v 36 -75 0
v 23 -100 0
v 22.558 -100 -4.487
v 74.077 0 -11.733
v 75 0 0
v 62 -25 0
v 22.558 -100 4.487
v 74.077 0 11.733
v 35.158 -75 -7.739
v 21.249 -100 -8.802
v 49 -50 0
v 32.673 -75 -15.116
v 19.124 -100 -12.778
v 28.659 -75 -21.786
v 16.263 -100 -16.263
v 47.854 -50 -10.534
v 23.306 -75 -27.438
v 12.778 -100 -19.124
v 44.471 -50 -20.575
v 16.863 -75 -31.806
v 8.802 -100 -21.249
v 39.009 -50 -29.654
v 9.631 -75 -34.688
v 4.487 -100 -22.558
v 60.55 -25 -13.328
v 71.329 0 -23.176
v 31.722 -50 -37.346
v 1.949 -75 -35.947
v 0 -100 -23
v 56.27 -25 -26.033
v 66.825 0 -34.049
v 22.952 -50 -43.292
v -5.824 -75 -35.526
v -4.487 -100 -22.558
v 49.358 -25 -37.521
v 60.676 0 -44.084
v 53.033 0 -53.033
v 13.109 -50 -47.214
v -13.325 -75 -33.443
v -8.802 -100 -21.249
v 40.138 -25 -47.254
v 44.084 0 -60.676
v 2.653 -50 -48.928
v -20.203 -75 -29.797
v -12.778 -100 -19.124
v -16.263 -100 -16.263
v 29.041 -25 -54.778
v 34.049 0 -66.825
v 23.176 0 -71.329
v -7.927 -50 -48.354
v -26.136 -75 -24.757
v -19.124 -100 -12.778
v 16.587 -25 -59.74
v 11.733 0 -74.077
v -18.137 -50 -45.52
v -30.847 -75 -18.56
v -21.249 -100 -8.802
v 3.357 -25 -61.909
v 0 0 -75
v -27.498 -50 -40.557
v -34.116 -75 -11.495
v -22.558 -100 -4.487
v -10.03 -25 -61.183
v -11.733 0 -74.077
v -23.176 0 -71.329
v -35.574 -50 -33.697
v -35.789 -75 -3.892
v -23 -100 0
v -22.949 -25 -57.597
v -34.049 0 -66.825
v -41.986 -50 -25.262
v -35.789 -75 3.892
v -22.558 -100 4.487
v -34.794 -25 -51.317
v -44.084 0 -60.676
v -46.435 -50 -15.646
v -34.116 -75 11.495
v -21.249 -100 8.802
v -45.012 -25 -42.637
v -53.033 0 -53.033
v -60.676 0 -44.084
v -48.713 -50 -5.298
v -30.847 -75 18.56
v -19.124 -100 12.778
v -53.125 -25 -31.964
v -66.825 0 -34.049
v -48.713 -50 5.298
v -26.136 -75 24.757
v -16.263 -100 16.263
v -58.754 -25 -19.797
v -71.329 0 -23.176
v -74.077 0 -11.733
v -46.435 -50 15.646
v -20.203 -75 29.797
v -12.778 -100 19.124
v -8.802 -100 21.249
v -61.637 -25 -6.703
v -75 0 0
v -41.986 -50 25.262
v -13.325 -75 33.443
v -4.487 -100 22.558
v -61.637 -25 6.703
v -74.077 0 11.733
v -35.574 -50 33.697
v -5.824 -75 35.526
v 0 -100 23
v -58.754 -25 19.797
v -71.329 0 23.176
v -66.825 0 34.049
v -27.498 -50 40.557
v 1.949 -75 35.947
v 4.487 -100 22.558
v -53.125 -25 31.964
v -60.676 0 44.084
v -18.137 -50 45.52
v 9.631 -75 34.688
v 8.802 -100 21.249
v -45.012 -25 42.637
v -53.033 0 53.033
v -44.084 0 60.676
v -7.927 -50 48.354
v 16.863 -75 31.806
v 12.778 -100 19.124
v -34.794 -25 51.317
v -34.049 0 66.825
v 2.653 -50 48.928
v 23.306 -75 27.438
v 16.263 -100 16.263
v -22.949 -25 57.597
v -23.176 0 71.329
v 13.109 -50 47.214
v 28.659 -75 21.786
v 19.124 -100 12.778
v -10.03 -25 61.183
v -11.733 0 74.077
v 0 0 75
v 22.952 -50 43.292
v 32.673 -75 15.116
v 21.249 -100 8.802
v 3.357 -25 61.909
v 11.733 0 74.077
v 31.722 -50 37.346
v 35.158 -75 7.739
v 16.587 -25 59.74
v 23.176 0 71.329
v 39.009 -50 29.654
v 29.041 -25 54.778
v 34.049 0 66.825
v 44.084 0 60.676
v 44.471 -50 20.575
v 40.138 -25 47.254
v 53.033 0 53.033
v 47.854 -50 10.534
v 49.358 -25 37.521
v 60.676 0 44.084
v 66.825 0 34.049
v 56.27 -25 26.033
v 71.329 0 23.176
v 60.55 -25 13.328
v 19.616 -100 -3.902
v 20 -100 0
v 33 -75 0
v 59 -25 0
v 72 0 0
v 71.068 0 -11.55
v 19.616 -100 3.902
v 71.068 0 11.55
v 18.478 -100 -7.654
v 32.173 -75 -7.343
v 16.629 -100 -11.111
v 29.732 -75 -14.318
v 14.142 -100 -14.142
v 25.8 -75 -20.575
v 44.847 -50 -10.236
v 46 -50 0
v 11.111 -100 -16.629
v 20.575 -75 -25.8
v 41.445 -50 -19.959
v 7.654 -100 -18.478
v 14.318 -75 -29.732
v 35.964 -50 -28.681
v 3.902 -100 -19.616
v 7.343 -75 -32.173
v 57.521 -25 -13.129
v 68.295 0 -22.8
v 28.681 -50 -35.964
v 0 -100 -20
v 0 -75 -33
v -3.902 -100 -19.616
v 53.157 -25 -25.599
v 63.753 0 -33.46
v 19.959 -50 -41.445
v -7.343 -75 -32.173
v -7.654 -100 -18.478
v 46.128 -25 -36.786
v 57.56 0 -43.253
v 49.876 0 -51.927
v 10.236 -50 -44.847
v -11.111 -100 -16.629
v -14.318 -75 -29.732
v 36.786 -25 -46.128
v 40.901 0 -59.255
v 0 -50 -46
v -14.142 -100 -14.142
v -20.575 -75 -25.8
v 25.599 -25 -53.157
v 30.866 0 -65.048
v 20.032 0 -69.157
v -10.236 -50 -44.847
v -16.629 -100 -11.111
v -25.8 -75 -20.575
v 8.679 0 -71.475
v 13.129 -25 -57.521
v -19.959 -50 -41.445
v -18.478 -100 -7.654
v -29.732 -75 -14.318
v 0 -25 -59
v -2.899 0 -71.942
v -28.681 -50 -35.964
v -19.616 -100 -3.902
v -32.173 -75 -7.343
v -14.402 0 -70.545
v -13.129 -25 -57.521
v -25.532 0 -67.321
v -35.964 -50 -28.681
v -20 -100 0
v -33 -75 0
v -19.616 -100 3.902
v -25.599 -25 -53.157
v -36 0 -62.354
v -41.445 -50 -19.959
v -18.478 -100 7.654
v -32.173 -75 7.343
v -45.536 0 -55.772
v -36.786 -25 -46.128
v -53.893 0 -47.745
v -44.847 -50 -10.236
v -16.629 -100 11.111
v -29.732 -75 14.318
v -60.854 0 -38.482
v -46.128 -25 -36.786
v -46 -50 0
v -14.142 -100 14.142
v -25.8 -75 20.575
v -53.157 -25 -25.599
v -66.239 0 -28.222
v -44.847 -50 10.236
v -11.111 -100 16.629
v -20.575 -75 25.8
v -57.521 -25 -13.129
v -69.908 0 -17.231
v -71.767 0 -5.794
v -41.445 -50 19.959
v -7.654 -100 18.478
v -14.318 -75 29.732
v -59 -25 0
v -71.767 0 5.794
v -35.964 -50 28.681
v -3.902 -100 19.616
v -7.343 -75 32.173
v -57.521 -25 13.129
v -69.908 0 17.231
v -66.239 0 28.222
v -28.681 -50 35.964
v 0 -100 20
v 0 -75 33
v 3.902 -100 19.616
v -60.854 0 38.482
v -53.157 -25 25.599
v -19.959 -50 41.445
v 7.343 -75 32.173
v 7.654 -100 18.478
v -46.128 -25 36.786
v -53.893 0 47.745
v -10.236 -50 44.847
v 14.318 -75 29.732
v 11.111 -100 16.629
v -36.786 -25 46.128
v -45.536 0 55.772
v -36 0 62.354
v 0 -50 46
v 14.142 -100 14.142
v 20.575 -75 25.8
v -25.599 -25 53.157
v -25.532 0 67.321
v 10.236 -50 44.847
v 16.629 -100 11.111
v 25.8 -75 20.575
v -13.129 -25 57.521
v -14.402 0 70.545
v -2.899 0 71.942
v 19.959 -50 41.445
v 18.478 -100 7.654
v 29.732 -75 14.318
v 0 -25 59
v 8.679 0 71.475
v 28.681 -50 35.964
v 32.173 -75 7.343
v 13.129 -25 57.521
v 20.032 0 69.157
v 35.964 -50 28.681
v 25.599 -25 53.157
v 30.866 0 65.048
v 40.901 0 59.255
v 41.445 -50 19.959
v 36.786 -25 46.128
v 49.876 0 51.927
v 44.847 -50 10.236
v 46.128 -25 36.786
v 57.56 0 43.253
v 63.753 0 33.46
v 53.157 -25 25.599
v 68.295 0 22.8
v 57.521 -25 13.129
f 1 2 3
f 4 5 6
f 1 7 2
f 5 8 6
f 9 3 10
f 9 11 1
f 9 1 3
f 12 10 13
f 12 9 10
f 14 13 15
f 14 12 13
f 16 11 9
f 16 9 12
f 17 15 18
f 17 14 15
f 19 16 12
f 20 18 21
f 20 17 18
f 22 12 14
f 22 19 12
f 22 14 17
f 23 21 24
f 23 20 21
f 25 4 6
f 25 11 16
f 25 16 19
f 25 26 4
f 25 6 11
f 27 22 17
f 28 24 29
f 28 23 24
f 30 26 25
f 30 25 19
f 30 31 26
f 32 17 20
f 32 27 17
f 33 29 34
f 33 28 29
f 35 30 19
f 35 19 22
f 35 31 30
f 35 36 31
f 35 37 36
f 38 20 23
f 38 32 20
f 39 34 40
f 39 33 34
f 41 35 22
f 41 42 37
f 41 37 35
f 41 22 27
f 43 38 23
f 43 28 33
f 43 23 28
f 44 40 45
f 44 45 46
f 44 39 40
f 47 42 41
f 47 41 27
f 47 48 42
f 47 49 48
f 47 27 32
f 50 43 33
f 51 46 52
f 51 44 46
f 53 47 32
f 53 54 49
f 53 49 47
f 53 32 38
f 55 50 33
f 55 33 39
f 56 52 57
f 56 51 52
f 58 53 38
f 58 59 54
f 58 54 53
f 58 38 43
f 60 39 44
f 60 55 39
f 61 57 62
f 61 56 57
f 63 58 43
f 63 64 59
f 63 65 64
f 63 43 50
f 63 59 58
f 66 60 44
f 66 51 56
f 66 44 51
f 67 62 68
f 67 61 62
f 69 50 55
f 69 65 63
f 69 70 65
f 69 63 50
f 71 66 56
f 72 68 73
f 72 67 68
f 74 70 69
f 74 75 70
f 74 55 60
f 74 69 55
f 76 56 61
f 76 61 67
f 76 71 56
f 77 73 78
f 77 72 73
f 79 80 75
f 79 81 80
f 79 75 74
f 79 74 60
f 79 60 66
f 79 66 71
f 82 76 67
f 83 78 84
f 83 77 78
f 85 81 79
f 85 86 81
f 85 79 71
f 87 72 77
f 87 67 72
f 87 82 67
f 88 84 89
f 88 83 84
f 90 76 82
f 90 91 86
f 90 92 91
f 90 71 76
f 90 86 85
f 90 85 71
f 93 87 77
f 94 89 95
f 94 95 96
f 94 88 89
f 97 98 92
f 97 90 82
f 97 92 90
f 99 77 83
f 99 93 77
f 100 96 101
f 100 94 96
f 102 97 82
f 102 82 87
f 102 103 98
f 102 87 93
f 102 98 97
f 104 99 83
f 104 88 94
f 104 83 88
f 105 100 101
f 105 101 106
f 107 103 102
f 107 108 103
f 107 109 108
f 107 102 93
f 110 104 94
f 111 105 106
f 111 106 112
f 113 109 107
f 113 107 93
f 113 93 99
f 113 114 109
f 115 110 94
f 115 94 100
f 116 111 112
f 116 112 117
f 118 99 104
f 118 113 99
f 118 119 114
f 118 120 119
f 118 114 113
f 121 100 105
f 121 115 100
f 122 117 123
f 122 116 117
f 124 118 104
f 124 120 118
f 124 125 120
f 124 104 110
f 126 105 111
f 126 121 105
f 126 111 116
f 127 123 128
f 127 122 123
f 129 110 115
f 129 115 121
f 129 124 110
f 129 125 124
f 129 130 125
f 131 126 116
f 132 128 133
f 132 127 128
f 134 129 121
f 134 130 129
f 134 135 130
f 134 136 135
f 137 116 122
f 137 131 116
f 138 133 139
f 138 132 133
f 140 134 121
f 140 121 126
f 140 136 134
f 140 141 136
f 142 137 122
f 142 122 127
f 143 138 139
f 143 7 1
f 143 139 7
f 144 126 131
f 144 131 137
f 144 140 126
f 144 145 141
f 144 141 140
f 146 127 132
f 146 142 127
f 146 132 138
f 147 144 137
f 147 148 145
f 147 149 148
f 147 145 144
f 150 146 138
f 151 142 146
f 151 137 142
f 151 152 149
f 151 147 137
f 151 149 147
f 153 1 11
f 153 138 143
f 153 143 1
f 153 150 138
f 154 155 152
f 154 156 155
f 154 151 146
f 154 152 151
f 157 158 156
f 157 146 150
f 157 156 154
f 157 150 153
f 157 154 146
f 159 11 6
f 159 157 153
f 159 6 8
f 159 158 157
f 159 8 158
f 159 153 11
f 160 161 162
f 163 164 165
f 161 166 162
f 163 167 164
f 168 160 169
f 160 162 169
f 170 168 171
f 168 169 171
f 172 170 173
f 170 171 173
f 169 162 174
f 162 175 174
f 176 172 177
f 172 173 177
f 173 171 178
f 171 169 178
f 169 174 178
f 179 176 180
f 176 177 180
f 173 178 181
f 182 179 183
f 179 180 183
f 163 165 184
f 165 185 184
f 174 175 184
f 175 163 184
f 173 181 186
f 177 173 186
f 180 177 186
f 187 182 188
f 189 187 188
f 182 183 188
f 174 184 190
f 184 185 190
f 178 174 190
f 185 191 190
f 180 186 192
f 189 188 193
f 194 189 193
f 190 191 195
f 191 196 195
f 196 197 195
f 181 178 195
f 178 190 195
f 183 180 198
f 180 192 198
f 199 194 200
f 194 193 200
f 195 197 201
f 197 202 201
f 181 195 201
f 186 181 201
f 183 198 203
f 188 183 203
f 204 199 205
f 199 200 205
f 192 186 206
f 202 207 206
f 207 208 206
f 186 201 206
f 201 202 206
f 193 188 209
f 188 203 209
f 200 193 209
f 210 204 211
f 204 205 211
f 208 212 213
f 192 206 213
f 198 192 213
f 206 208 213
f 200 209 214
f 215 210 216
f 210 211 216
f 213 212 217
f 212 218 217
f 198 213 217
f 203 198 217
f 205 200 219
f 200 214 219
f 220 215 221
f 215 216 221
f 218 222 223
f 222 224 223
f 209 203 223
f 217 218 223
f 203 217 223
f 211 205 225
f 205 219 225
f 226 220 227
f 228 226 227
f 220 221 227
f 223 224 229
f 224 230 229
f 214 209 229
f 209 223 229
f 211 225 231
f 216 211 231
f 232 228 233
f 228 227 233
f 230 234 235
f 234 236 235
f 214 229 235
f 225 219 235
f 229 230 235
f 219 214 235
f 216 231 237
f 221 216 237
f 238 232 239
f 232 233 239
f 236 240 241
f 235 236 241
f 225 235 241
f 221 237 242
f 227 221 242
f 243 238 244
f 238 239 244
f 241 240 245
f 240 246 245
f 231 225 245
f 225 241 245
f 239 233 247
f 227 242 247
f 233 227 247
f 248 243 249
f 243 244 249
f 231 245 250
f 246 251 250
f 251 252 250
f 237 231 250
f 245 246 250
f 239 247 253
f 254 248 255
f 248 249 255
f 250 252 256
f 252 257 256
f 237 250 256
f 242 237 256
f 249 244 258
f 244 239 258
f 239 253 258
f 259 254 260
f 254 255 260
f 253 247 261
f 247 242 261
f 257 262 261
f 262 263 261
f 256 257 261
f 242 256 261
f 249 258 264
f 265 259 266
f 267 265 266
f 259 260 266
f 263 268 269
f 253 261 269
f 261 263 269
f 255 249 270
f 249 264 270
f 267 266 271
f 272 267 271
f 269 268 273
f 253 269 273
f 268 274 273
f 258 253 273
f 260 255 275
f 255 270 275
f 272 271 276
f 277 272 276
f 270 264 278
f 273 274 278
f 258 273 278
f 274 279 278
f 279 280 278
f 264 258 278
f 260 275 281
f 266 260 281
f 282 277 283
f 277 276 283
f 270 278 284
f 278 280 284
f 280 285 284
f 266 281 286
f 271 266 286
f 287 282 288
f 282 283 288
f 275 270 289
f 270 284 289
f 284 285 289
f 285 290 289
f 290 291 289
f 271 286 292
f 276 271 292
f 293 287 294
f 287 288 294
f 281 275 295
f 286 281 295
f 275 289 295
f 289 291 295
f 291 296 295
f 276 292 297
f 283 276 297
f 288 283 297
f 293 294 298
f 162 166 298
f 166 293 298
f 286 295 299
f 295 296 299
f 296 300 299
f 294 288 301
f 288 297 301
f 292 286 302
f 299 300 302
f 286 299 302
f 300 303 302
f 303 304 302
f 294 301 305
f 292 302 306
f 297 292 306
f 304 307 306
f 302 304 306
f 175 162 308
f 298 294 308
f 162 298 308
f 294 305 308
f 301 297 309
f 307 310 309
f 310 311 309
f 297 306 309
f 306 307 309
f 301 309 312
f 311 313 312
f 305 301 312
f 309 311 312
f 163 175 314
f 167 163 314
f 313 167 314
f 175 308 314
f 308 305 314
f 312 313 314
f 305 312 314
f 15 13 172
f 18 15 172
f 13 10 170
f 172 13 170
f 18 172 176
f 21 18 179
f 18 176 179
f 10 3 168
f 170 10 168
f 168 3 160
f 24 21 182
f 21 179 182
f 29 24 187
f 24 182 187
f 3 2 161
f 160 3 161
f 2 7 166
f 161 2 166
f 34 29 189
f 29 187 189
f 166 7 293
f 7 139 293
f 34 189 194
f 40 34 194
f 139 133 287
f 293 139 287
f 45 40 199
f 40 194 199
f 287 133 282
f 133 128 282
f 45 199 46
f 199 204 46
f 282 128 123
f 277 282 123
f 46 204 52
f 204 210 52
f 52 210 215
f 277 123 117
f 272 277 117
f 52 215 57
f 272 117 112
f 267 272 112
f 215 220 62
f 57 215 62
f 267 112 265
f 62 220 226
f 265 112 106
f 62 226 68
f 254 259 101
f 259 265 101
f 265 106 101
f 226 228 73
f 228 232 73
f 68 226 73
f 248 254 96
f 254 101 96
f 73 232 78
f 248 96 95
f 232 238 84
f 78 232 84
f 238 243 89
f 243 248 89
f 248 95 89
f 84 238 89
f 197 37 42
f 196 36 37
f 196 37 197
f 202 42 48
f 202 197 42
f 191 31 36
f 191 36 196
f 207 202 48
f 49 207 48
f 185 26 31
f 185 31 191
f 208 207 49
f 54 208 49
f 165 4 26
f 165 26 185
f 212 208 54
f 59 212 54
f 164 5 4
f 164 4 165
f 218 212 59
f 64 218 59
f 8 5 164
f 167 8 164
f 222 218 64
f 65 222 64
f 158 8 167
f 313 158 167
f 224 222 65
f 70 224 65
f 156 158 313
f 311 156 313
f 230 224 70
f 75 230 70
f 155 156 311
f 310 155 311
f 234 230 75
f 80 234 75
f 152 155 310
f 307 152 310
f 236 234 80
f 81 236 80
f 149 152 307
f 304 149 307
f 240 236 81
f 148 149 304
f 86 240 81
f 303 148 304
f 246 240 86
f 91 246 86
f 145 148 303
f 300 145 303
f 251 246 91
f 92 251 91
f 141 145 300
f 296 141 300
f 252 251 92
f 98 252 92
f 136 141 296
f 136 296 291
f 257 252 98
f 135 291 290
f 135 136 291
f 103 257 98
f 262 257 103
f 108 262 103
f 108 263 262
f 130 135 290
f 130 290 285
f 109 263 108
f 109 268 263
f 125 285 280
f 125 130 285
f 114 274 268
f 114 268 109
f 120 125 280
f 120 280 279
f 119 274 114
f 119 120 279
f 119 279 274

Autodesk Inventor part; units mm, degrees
ref_plane "YZ Plane" through (0, 0, 0) normal (1, 0, 0) x (0, 1, 0)
ref_plane "XZ Plane" through (0, 0, 0) normal (0, 1, 0) x (-1, 0, 0)
ref_plane "XY Plane" through (0, 0, 0) normal (0, 0, 1) x (1, 0, 0)
sketch "Sketch1" plane through (0, 0, 0) normal (0, 1, 0) x (-1, 0, 0)
  circle A0 centre (0, 0) radius 75
  dimension "d0" = 150
extrude "Extrusion1" add sketch "Sketch1" against normal blind 100
sketch "Sketch2" plane through (0, 0, 0) normal (0, 1, 0) x (1, 0, 0)
  circle A0 centre (0, 0) radius 72
  dimension "d3" = 144
sketch "Sketch4" plane through (0, 0, 0) normal (0, 0, 1) x (1, 0, 0)
  line L0 (-75, -100) -> (75, -100) projected
  line L1 (0, -100) -> (23, -100)
  line L2 (75, 0) -> (-75, 0) projected
  line L3 (23, -100) -> (75, 0)
  line L4 (75, 0) -> (23, -100)
  line L5 (23, -100) -> (75, 0)
  line L6 (75, 0) -> (23, -100)
  line L7 (0, -100) -> (-23, -100)
  line L8 (-75, 0) -> (-23, -100)
  line L9 (75, 0) -> (75, -100)
  line L10 (23, -100) -> (75, -100)
  line L11 (0, -120) -> (0, 20) projected
  line L12 (75, 0) -> (72, 0)
  line L13 (72, 0) -> (20, -100)
  line L14 (20, -100) -> (0, -100)
  line L15 (0, -100) -> (0, 0)
  line L16 (0, 0) -> (72, 0)
  dimension "d5" = 23
  dimension "d10" = 23
  dimension "d14" = 3
sketch "Sketch7" plane through (0, 0, 0) normal (1, 0, 0) x (0, 1, 0)
  line L0 (0, -75) -> (0, 75) projected
  line L1 (0, 75) -> (-100, 75)
  line L2 (0, 75) -> (-100, 75) projected
  line L3 (-100, 75) -> (-100, -75) projected
  line L4 (-100, 75) -> (-100, 20)
  point P0 (0, 0)
  dimension "d9" = 100
sketch "Sketch11" plane through (0, -100, 0) normal (0, -1, 0) x (1, 0, 0)
  circle A0 centre (0, 0) radius 20
  circle A1 centre (0, 0) radius 23
  dimension "d11" = 40
  dimension "d12" = 46
revolve "Revolution3" cut sketch "Sketch4" angle 360 about axis through (0, -10, 0) along (0, 1, 0) contours L3 L9 L0
revolve "Revolution4" cut sketch "Sketch4" angle 360 about axis through (0, -10, 0) along (0, 1, 0) contours L11 L2 L13 L0
properties part number "cone"
